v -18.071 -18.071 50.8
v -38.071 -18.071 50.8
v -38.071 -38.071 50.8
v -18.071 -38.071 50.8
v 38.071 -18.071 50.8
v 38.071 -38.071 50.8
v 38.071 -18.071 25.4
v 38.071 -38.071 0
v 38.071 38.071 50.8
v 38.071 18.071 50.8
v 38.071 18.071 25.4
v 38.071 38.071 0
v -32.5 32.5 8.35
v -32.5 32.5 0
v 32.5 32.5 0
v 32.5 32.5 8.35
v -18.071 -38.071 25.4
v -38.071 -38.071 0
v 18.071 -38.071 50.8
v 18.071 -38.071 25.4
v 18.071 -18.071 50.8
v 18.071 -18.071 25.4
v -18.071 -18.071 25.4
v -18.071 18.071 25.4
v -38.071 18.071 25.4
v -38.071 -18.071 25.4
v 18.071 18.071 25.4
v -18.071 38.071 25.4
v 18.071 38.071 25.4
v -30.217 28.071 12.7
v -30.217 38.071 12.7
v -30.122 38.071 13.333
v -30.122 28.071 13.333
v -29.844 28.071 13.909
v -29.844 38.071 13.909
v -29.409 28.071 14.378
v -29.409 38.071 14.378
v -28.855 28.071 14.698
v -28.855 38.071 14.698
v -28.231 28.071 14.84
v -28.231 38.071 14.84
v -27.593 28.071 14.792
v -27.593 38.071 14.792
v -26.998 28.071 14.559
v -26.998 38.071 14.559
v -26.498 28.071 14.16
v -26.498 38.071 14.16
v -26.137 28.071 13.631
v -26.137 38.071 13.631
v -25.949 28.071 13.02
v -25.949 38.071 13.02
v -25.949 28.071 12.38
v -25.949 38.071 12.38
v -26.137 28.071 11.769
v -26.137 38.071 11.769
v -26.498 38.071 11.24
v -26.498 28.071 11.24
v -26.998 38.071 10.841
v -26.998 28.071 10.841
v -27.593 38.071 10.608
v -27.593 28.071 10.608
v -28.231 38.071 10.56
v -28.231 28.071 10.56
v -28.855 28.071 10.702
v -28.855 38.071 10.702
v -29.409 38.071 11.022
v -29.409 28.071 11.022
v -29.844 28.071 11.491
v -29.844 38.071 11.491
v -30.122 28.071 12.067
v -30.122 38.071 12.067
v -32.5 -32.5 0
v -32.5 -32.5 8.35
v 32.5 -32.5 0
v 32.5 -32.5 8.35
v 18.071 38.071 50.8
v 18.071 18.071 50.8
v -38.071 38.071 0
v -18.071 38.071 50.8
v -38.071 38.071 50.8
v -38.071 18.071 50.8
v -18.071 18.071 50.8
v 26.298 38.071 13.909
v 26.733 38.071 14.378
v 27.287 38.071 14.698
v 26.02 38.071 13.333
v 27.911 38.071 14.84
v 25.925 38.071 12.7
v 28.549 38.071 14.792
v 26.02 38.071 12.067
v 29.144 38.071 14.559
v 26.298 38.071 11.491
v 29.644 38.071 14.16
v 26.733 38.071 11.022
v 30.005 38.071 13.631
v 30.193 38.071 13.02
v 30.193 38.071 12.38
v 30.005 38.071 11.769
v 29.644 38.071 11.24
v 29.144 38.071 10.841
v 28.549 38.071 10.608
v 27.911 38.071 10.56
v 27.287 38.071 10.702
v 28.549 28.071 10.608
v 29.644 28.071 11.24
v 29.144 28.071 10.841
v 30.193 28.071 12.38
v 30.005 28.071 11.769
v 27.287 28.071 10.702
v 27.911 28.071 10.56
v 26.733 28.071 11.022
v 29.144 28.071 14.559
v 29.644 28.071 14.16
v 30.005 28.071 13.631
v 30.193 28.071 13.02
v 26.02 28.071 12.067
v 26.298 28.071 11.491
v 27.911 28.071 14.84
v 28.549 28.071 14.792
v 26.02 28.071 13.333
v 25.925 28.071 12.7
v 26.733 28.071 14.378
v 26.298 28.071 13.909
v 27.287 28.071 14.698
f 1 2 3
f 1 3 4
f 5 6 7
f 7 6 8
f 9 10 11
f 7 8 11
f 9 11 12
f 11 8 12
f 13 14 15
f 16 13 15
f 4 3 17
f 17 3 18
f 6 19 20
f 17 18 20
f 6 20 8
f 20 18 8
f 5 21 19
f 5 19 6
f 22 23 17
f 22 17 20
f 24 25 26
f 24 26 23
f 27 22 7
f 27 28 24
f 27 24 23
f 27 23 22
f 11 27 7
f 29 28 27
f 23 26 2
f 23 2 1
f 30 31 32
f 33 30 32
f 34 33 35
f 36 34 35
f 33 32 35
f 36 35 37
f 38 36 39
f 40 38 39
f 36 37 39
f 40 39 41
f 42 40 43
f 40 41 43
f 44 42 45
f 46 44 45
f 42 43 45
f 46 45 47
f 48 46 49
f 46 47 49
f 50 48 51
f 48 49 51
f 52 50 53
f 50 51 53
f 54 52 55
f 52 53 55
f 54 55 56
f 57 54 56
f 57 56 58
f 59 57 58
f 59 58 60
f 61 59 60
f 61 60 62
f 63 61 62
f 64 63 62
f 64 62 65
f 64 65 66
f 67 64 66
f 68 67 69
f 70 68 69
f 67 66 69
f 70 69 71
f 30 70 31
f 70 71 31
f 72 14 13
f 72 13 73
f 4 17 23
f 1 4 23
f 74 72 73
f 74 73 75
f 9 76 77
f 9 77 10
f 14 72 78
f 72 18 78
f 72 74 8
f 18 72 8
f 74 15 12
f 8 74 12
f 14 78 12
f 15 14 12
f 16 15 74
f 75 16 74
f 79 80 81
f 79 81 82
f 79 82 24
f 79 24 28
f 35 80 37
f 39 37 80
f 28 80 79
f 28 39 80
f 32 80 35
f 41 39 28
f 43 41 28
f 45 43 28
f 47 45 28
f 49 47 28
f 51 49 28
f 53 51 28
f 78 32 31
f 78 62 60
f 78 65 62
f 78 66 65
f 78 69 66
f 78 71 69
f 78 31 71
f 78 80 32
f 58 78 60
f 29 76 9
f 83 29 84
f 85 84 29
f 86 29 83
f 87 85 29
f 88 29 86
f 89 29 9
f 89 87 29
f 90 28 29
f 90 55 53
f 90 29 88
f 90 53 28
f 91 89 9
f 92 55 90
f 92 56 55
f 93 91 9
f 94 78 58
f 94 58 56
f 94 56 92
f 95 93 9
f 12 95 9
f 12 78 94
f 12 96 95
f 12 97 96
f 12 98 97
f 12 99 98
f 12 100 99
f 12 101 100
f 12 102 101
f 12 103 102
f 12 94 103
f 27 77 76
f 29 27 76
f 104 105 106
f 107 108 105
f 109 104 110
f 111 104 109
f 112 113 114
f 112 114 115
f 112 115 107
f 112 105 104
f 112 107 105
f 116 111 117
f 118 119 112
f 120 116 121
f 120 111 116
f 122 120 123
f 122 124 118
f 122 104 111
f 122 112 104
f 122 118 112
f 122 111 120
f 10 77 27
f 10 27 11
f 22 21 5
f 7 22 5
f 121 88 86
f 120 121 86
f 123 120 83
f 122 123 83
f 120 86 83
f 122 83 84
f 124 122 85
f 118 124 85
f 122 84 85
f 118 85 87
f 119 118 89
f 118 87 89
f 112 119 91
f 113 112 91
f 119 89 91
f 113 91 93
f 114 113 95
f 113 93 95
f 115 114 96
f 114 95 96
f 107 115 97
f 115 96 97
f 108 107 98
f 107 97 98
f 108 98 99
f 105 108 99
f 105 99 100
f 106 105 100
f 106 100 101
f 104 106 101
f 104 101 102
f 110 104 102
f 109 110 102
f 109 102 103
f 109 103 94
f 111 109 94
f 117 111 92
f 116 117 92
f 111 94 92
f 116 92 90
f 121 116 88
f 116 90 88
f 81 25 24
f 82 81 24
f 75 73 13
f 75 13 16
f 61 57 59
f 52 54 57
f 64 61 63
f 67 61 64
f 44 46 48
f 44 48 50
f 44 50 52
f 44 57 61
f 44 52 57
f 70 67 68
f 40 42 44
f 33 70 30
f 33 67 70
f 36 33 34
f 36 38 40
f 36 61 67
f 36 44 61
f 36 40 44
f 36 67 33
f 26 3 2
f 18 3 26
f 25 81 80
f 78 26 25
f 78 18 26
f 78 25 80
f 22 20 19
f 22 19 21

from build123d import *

# Parameters (mm, degrees)
SKETCH_W        = 76.142136
SKETCH_H        = 76.142136
PAD_DEPTH       = 25.4
SKETCH001_W     = 20
SKETCH001_H     = 20
PAD001_DEPTH    = 25.4
SKETCH002_W     = 65
SKETCH002_H     = 65
POCKET_DEPTH    = 8.35
SKETCH003_R     = 2.1463
POCKET001_DEPTH = 10


with BuildPart() as part:
    # Sketch → Pad (new body)
    with BuildSketch(Plane.XY):
        Rectangle(SKETCH_W, SKETCH_H)
    extrude(amount=PAD_DEPTH)

    # Sketch001 (on Face6 of Pad) → Pad001 (join)
    with BuildSketch(Plane.XY.offset(25.4)):
        with Locations((-28.071068, 28.071068)):
            Rectangle(SKETCH001_W, SKETCH001_H)
        with Locations((28.071068, 28.071068)):
            Rectangle(SKETCH001_W, SKETCH001_H)
        with Locations((28.071068, -28.071068)):
            Rectangle(SKETCH001_W, SKETCH001_H)
        with Locations((-28.071068, -28.071068)):
            Rectangle(SKETCH001_W, SKETCH001_H)
    extrude(amount=PAD001_DEPTH)

    # Sketch002 (on Face4 of Pad001) → Pocket (cut)
    with BuildSketch(Plane(origin=(0, 0, 0), x_dir=(1, 0, 0), z_dir=(0, 0, -1))):
        Rectangle(SKETCH002_W, SKETCH002_H)
    extrude(amount=-POCKET_DEPTH, mode=Mode.SUBTRACT)

    # Sketch003 (on Face1 of Pocket) → Pocket001 (cut)
    with BuildSketch(Plane(origin=(0, 38.071068, 0), x_dir=(-1, 0, 0), z_dir=(0, 1, 0))):
        with Locations((-28.071068, 12.7)):
            Circle(SKETCH003_R)
        with Locations((28.071068, 12.7)):
            Circle(SKETCH003_R)
    extrude(amount=-POCKET001_DEPTH, mode=Mode.SUBTRACT)


solid = part.part
